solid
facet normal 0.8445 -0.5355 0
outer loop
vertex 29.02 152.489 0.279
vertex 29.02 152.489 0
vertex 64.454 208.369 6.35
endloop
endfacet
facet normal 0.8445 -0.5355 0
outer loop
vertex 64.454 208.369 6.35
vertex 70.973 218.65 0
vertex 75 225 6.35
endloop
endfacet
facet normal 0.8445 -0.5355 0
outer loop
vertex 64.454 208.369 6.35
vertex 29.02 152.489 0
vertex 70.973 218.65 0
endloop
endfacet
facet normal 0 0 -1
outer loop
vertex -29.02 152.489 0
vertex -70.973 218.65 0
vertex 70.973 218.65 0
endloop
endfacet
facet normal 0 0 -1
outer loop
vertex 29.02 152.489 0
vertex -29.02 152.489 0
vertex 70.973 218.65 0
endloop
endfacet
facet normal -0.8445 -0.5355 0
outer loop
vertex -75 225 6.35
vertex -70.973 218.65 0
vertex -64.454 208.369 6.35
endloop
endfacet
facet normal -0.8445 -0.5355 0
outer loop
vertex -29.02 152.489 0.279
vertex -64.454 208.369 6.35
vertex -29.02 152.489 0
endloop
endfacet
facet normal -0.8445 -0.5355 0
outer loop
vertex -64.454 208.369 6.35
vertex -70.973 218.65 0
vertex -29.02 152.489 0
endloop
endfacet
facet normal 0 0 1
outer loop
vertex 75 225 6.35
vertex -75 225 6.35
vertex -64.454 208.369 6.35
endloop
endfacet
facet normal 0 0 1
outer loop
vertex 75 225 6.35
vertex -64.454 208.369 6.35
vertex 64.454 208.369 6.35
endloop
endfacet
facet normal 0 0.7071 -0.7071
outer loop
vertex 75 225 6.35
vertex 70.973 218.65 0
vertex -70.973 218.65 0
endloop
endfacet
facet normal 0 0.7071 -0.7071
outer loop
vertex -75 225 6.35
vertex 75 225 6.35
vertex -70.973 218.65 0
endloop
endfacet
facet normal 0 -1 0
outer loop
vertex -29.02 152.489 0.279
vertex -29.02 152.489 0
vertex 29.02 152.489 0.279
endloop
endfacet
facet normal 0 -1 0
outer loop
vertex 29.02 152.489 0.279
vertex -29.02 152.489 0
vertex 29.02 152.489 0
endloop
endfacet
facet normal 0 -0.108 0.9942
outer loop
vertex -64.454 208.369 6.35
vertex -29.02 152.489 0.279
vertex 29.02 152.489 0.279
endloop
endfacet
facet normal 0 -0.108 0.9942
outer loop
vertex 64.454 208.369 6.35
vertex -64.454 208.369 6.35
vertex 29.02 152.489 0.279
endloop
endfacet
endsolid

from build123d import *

# Parameters (mm, degrees)
F1_DEPTH = 6.35
F2_SIZE  = 6.34999
F3_SIZE2 = 6.0705106322
F3_SIZE  = 55.88


# Not quite as in the source:
# - a fillet or chamfer is up to 0.001 mm smaller than in the source, because OpenCascade refuses the exact size


with BuildPart() as f1:
    # F0 (on Top) → F1 (new body)
    with BuildSketch(Plane.XY):
        Polygon((75, 225), (-75, 225), (-29.020415619, 152.489066124), (29.020415619, 152.489066124), align=None)
    extrude(amount=F1_DEPTH)

    # F2 (size 6.35 in the source; OpenCascade refuses exactly that, so slightly less here)
    f2_edges = [f1.edges().sort_by_distance(p)[0] for p in [
        (0, 225, 0),
    ]]
    chamfer(f2_edges, length=F2_SIZE)

    # F3
    f3_edges = [f1.edges().sort_by_distance(p)[0] for p in [
        (0, 152.489066, 6.35),
    ]]
    f3_side = f1.faces().sort_by_distance((0, 194.086469, 6.35))[0]
    chamfer(f3_edges, length=F3_SIZE, length2=F3_SIZE2, reference=f3_side)


solid = f1.part
